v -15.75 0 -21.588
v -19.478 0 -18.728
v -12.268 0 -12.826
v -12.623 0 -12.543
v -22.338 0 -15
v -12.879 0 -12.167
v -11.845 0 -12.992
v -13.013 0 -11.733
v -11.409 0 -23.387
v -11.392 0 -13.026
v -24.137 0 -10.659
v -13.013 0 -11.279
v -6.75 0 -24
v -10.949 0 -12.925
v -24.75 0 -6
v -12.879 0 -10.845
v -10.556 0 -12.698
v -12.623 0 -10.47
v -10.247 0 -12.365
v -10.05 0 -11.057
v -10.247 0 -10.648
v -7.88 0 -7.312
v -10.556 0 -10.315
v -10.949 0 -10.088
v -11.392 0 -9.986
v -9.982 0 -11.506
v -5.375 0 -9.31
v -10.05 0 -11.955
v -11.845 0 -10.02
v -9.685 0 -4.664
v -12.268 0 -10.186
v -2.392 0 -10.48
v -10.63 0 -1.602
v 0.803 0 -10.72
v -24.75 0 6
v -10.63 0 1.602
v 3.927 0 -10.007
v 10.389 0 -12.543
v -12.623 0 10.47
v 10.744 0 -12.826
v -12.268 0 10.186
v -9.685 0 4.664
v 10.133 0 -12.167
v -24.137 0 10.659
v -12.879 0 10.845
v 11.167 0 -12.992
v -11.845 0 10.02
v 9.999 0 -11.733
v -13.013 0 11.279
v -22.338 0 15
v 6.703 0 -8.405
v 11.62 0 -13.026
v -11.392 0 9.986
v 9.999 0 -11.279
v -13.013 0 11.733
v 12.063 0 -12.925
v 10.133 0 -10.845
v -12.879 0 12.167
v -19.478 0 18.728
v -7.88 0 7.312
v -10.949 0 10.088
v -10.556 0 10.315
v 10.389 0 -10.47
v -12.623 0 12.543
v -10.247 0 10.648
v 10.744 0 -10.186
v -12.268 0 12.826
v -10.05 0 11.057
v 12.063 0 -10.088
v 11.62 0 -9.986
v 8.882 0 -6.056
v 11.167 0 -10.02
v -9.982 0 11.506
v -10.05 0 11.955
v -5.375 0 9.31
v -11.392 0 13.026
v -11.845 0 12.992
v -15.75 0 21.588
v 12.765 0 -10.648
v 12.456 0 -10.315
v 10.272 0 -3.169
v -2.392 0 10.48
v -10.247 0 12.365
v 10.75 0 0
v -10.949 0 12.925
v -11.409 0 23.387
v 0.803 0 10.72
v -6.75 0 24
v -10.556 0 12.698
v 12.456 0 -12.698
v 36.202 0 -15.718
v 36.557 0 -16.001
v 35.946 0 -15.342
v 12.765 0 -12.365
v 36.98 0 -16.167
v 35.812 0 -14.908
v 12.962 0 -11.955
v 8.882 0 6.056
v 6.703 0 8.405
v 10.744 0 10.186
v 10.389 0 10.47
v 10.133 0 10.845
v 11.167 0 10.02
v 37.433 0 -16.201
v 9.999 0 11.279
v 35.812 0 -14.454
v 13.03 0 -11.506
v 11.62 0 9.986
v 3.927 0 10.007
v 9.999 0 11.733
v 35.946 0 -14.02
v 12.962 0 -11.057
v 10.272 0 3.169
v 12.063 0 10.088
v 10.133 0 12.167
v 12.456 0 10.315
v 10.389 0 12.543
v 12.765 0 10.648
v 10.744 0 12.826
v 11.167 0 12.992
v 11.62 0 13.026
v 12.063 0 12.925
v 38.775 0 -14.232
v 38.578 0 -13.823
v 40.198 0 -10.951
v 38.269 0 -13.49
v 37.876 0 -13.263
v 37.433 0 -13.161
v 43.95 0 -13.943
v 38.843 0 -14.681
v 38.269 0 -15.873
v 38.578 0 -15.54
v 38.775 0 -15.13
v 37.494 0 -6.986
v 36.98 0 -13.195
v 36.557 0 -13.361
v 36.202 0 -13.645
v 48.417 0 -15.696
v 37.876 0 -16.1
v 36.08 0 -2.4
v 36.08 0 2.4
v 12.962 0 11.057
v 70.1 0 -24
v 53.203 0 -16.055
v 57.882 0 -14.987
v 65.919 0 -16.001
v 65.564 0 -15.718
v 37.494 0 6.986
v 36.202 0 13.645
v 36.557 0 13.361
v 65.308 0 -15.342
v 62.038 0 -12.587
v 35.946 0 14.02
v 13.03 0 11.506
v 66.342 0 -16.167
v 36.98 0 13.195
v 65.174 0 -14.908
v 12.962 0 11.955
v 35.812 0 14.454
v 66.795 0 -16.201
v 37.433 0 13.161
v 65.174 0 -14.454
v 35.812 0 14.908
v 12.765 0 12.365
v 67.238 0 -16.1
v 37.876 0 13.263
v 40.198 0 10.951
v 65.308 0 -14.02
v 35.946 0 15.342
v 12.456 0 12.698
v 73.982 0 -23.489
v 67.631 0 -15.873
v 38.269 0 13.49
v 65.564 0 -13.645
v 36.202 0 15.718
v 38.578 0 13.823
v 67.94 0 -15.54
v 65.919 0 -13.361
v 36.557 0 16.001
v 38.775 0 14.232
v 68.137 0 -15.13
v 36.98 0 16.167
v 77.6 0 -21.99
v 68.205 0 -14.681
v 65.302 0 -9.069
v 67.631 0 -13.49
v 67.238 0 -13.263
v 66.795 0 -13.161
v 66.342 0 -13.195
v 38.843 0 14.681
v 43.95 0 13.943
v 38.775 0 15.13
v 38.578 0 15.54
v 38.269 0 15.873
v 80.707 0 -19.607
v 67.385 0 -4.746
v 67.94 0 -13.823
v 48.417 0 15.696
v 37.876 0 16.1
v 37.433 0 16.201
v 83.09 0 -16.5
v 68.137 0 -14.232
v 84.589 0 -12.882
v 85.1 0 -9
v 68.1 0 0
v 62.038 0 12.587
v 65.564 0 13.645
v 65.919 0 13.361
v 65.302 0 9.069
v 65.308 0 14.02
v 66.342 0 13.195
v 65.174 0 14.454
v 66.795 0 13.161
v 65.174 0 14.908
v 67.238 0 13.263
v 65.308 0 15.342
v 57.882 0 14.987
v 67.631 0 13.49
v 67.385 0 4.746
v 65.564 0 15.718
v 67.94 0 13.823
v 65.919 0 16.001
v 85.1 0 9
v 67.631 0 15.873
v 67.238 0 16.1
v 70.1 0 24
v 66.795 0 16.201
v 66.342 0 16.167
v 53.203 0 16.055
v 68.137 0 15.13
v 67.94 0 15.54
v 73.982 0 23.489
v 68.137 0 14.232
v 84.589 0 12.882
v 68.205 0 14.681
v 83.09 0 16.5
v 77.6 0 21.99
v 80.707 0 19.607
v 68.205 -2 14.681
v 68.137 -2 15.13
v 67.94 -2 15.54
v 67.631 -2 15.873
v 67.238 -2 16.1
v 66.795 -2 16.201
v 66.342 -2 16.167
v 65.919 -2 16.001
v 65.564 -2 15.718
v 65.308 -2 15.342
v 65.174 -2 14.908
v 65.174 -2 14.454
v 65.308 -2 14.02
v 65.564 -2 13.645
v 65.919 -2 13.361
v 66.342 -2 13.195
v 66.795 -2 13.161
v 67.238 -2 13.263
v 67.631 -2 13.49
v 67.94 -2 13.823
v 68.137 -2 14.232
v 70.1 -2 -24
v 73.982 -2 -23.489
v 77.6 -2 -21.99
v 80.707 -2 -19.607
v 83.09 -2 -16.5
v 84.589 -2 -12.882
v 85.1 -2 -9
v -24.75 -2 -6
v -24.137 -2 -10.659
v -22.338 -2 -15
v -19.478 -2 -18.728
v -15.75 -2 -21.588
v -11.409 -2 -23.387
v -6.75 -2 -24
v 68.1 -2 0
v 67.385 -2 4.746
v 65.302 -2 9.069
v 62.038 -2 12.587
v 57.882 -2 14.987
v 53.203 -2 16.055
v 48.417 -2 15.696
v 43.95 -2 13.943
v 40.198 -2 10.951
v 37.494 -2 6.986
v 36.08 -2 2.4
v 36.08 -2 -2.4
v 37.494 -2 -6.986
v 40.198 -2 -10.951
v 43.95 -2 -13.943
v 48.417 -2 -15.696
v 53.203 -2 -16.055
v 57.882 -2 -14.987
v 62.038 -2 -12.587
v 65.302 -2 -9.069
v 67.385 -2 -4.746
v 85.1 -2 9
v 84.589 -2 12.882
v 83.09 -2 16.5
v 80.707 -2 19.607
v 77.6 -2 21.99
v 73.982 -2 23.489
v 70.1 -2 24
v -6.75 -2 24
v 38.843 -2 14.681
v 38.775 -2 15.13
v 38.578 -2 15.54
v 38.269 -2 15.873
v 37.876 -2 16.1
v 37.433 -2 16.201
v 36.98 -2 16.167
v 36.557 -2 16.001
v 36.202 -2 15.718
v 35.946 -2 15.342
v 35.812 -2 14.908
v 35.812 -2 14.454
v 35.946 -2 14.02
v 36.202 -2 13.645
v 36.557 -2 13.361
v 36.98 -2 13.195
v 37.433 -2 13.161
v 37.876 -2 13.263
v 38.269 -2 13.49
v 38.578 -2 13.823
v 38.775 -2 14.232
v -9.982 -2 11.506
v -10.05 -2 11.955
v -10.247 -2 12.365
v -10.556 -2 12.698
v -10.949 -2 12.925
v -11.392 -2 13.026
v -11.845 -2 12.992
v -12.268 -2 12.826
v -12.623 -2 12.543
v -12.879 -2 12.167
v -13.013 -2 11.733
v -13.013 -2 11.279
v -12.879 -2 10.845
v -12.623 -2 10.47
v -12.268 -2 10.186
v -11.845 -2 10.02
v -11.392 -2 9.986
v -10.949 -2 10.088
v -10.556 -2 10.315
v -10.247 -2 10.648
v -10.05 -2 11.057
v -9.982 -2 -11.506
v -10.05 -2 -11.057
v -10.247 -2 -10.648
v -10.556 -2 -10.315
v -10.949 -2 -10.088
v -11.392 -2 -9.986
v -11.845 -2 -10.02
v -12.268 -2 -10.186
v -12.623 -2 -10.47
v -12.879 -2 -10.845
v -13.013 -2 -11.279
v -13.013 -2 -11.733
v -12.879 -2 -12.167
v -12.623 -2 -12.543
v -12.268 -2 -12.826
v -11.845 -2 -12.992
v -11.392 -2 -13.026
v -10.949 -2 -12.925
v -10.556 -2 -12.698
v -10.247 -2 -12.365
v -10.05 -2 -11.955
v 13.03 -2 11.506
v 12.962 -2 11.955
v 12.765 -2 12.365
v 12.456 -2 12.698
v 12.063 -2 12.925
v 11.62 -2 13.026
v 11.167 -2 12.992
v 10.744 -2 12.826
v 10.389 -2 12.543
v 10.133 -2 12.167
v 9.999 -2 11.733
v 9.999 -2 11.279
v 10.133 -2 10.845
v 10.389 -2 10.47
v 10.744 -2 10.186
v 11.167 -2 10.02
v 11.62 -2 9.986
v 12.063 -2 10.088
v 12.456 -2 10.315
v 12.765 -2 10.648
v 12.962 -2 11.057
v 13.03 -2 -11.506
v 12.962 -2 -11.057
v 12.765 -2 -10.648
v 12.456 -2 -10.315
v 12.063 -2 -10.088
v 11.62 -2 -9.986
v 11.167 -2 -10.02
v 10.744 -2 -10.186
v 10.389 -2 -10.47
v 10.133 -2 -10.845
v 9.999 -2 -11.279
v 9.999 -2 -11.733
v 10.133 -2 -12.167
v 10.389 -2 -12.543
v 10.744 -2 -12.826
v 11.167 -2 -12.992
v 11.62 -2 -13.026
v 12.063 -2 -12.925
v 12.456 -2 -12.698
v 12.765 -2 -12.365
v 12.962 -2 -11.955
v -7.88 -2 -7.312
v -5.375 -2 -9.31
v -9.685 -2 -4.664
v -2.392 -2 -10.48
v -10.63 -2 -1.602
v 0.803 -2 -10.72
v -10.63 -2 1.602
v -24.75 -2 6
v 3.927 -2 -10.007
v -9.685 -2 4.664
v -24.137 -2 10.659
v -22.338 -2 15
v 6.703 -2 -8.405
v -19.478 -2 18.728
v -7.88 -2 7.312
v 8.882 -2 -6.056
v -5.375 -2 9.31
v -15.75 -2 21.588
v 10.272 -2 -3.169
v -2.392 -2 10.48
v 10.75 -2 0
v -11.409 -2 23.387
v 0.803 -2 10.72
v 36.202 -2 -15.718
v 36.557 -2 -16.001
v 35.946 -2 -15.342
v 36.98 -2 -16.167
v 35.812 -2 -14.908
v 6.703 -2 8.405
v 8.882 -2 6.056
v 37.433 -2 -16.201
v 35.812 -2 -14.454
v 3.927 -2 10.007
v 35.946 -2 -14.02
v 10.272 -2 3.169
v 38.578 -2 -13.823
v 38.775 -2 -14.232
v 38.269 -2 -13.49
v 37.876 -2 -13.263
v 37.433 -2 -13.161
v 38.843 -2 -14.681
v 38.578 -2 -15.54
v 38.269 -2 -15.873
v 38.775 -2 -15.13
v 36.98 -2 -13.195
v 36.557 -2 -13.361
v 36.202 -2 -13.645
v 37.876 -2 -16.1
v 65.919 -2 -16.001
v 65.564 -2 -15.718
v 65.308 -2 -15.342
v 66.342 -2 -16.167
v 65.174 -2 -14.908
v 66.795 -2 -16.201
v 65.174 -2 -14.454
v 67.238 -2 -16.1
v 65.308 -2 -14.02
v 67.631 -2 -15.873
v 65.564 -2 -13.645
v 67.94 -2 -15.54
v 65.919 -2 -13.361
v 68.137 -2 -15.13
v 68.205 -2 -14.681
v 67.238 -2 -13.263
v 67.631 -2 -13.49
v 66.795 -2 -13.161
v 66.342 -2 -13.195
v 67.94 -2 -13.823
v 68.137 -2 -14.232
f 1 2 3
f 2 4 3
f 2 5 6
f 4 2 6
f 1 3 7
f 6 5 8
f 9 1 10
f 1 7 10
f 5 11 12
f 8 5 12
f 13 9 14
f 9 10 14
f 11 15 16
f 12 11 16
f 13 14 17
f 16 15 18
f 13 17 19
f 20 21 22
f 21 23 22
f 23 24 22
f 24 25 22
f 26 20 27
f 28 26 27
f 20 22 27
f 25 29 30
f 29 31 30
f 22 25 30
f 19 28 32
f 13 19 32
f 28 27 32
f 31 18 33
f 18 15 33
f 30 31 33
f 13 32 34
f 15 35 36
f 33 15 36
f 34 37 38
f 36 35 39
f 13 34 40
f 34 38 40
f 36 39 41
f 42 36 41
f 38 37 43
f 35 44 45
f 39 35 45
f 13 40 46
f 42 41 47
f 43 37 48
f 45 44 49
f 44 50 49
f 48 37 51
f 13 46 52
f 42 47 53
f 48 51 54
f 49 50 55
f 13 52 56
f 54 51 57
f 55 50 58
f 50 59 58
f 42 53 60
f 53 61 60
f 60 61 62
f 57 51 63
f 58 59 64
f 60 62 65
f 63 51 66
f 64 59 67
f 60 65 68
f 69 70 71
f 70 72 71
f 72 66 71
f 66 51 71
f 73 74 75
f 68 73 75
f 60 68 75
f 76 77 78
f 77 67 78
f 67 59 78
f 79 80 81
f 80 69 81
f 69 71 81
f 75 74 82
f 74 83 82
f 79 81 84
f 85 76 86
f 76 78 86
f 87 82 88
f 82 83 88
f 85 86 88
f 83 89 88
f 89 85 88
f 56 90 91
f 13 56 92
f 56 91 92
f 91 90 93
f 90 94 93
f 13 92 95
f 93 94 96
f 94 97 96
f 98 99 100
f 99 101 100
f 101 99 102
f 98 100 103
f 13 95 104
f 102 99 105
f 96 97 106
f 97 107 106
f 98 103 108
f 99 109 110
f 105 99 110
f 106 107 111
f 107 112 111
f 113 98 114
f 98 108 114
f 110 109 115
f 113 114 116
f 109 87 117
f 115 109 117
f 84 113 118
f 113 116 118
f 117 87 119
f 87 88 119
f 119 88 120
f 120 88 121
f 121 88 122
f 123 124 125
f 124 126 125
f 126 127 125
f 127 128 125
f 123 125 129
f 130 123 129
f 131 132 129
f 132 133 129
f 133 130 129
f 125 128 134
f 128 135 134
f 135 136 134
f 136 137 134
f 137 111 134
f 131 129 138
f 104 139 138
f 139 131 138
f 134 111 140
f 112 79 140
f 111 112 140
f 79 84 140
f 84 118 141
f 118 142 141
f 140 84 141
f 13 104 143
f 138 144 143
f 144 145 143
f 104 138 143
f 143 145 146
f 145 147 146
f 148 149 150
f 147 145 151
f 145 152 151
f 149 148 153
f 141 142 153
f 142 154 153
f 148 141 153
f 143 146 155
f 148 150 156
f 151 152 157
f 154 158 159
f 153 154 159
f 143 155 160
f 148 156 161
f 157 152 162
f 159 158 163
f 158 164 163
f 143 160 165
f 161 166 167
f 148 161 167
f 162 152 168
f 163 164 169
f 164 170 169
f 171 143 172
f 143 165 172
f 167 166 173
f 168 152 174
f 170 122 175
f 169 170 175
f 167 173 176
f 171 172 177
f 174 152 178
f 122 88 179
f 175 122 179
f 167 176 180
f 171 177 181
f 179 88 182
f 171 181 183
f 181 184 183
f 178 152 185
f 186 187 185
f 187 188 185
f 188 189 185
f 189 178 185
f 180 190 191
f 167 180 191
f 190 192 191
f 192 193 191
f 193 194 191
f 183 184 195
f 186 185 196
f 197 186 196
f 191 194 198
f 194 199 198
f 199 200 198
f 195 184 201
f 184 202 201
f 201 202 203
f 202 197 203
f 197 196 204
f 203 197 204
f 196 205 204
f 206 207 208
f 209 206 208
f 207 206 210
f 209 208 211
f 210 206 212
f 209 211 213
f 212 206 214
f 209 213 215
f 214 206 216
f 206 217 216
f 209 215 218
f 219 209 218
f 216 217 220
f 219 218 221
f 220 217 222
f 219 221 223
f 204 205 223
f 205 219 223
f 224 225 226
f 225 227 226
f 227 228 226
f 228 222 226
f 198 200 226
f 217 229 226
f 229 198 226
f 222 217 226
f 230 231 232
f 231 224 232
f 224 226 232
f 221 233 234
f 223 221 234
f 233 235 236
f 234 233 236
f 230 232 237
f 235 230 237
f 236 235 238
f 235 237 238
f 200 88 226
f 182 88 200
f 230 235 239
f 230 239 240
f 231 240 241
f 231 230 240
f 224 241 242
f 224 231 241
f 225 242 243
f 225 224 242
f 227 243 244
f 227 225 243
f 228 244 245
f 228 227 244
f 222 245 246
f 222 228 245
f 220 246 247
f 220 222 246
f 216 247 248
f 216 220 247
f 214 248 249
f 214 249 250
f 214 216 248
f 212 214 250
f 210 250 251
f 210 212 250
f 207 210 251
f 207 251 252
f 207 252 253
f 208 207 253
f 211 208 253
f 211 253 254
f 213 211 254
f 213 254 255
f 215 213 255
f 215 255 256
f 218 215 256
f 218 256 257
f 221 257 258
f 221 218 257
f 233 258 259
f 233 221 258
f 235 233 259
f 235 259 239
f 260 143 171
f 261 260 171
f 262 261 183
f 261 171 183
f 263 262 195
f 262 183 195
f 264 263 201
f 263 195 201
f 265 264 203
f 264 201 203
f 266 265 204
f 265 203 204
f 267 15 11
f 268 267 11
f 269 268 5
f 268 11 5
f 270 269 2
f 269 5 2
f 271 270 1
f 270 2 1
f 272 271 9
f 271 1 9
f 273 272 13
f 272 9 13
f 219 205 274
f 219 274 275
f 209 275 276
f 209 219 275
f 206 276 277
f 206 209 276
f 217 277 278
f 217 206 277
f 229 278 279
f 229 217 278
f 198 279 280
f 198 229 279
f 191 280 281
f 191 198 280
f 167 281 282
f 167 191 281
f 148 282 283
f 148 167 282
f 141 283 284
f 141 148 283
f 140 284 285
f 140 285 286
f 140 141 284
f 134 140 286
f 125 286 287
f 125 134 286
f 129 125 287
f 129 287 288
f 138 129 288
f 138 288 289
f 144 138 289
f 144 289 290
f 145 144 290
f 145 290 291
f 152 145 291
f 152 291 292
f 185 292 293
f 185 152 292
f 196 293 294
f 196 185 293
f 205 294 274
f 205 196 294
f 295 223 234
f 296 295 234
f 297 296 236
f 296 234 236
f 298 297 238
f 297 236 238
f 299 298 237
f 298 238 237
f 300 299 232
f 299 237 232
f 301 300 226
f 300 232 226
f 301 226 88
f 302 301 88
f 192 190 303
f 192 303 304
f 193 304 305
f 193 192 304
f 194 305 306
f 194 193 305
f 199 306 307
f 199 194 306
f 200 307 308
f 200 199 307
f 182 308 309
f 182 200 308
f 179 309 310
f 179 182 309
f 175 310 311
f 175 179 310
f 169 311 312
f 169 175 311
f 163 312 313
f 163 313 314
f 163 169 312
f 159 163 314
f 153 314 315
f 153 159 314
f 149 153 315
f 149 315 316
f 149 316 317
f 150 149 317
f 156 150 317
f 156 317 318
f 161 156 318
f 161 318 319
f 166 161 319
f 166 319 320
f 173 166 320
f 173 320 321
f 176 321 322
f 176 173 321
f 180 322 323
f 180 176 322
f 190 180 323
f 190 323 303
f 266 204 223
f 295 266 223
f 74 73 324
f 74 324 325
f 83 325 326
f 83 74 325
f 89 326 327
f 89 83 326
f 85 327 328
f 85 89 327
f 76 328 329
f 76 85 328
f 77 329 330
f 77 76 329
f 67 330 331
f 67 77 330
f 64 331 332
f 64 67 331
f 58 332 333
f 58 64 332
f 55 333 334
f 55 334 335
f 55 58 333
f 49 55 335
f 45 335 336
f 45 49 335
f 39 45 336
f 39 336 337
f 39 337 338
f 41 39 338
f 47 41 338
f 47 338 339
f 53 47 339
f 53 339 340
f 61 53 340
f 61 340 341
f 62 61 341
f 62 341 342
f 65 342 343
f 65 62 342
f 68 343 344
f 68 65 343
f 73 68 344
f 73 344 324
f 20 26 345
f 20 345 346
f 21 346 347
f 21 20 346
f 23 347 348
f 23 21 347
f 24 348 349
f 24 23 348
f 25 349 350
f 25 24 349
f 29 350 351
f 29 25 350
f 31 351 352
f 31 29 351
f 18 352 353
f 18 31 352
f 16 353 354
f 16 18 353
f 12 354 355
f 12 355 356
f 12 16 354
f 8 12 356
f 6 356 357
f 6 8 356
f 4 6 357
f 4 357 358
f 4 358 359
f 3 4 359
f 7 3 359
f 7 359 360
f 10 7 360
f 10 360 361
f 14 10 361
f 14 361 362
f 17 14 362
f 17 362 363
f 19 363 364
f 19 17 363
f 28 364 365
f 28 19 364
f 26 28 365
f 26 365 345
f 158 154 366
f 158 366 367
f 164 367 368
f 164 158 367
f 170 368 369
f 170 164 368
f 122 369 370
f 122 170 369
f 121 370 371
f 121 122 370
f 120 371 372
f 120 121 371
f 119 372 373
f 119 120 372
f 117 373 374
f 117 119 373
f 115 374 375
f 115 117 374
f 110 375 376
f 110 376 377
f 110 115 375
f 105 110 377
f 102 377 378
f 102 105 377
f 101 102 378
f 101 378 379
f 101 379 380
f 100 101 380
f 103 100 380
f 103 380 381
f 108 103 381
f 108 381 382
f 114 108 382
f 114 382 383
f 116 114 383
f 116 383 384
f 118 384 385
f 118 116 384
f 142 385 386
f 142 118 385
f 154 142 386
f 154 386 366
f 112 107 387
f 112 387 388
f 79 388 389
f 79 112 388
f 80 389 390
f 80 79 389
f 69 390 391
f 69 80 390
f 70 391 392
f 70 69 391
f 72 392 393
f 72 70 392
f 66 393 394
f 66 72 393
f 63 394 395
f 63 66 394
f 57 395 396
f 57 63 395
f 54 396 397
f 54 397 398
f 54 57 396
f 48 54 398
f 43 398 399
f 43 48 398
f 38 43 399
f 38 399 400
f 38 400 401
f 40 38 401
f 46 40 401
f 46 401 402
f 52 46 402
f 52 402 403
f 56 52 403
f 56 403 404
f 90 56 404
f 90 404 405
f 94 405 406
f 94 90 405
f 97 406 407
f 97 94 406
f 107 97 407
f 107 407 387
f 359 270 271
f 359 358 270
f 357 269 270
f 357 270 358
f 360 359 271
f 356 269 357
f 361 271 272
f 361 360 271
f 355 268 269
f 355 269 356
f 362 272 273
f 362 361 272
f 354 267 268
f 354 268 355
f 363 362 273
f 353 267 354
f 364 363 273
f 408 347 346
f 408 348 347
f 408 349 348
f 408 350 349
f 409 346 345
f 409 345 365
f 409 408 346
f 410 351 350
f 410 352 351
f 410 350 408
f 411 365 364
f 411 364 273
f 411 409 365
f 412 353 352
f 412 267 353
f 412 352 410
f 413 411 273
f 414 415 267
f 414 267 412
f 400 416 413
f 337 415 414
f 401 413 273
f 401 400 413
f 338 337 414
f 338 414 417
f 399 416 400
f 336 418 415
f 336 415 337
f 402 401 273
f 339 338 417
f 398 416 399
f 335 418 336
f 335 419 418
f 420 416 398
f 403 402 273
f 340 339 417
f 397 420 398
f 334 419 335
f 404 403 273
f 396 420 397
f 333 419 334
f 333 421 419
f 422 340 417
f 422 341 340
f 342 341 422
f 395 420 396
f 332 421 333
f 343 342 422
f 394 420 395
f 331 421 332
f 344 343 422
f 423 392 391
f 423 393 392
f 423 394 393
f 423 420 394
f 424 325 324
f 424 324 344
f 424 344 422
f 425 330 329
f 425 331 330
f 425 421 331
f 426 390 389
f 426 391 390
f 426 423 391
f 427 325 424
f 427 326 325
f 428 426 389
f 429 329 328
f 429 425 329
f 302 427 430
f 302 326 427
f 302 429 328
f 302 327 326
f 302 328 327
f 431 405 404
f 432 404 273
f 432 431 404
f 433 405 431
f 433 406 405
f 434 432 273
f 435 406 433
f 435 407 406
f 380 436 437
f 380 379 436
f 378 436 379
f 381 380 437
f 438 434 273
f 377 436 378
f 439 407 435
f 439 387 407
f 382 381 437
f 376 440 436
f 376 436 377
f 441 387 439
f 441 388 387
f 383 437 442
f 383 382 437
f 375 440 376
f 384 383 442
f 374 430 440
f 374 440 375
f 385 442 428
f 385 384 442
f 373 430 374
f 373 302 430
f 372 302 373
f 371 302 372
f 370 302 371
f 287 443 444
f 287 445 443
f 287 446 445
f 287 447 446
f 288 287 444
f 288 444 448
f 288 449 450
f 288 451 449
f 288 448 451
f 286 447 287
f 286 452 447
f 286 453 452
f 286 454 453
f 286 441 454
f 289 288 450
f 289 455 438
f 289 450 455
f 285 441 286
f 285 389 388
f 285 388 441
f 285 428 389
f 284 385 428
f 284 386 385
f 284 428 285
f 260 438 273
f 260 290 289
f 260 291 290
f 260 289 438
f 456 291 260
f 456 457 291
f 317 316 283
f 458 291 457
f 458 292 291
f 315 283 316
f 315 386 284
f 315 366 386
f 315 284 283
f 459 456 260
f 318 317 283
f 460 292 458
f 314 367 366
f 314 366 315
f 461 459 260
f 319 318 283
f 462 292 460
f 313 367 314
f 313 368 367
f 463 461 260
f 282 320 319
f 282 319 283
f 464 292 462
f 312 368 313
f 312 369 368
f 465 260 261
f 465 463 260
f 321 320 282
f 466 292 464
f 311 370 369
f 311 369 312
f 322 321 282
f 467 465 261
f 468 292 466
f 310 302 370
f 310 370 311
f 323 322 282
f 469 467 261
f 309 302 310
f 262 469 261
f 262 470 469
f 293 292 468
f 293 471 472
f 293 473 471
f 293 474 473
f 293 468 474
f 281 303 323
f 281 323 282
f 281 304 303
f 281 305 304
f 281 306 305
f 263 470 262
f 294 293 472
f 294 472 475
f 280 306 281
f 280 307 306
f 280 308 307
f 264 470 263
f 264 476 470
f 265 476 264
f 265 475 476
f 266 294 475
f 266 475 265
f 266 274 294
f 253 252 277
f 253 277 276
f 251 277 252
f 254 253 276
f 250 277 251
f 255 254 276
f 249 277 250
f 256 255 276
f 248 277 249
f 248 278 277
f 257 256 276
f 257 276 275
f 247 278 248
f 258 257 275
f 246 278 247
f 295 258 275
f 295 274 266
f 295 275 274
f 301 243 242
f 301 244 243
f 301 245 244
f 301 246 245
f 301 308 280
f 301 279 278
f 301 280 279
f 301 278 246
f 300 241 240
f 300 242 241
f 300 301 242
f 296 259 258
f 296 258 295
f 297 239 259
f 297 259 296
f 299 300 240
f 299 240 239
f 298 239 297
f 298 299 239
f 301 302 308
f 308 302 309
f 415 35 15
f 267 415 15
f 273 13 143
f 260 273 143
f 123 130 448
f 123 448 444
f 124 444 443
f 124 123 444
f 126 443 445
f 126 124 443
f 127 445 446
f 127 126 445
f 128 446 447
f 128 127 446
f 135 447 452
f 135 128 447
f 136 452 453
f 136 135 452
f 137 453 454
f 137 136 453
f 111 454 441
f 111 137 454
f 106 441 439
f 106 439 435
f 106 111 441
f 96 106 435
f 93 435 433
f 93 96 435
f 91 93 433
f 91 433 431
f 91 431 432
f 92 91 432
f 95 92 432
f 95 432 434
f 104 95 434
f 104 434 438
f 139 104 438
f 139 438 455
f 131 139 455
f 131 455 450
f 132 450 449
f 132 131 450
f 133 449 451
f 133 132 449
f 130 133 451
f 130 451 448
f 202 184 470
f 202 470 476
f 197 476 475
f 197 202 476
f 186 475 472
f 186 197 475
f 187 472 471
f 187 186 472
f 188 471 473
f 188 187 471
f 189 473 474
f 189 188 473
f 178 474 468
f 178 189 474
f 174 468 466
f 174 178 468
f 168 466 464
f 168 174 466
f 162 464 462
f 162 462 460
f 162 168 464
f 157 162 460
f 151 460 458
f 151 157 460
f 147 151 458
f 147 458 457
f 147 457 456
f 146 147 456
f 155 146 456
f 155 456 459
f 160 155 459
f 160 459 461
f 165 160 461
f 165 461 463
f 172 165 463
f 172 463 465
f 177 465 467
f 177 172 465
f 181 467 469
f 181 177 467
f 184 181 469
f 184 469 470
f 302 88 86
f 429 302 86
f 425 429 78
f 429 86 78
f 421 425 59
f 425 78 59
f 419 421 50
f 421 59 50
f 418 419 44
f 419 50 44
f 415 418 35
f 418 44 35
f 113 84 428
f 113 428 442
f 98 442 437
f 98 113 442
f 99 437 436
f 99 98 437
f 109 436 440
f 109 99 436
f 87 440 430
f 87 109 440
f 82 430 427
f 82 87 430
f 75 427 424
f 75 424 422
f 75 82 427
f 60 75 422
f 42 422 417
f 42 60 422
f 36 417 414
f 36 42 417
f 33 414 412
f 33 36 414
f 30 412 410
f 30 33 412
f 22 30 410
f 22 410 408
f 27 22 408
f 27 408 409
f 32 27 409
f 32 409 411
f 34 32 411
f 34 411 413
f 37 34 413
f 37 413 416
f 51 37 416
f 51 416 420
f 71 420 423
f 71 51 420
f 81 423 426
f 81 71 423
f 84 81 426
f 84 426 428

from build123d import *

# Parameters (mm, degrees)
F0_R     = 1.524
F0_R_2   = 10.75
F0_R_3   = 16.1
F1_DEPTH = 2


with BuildPart() as f1:
    # F0 (on Front) → F1 (new body)
    with BuildSketch(Plane.XZ):
        with BuildLine():
            Line((-24.75, 6), (-24.75, 0))
            Line((-24.75, 0), (-24.75, -6))
            ThreePointArc((-24.75, -6), (-19.477922, -18.727922), (-6.75, -24))
            Line((-6.75, -24), (70.1, -24))
            ThreePointArc((70.1, -24), (80.706602, -19.606602), (85.1, -9))
            Line((85.1, -9), (85.1, 0))
            Line((85.1, 0), (85.1, 9))
            ThreePointArc((85.1, 9), (80.706602, 19.606602), (70.1, 24))
            Line((70.1, 24), (-6.75, 24))
            ThreePointArc((-6.75, 24), (-19.477922, 18.727922), (-24.75, 6))
        make_face()
        with Locations((-11.5062, -11.5062)):
            Circle(F0_R, mode=Mode.SUBTRACT)
        with Locations((11.5062, -11.5062)):
            Circle(F0_R, mode=Mode.SUBTRACT)
        with Locations((37.3188, -14.6812)):
            Circle(F0_R, mode=Mode.SUBTRACT)
        with Locations((66.6812, -14.6812)):
            Circle(F0_R, mode=Mode.SUBTRACT)
        Circle(F0_R_2, mode=Mode.SUBTRACT)
        with Locations((-11.5062, 11.5062)):
            Circle(F0_R, mode=Mode.SUBTRACT)
        with Locations((11.5062, 11.5062)):
            Circle(F0_R, mode=Mode.SUBTRACT)
        with Locations((52, 0)):
            Circle(F0_R_3, mode=Mode.SUBTRACT)
        with Locations((37.3188, 14.6812)):
            Circle(F0_R, mode=Mode.SUBTRACT)
        with Locations((66.6812, 14.6812)):
            Circle(F0_R, mode=Mode.SUBTRACT)
    extrude(amount=F1_DEPTH)


solid = f1.part
